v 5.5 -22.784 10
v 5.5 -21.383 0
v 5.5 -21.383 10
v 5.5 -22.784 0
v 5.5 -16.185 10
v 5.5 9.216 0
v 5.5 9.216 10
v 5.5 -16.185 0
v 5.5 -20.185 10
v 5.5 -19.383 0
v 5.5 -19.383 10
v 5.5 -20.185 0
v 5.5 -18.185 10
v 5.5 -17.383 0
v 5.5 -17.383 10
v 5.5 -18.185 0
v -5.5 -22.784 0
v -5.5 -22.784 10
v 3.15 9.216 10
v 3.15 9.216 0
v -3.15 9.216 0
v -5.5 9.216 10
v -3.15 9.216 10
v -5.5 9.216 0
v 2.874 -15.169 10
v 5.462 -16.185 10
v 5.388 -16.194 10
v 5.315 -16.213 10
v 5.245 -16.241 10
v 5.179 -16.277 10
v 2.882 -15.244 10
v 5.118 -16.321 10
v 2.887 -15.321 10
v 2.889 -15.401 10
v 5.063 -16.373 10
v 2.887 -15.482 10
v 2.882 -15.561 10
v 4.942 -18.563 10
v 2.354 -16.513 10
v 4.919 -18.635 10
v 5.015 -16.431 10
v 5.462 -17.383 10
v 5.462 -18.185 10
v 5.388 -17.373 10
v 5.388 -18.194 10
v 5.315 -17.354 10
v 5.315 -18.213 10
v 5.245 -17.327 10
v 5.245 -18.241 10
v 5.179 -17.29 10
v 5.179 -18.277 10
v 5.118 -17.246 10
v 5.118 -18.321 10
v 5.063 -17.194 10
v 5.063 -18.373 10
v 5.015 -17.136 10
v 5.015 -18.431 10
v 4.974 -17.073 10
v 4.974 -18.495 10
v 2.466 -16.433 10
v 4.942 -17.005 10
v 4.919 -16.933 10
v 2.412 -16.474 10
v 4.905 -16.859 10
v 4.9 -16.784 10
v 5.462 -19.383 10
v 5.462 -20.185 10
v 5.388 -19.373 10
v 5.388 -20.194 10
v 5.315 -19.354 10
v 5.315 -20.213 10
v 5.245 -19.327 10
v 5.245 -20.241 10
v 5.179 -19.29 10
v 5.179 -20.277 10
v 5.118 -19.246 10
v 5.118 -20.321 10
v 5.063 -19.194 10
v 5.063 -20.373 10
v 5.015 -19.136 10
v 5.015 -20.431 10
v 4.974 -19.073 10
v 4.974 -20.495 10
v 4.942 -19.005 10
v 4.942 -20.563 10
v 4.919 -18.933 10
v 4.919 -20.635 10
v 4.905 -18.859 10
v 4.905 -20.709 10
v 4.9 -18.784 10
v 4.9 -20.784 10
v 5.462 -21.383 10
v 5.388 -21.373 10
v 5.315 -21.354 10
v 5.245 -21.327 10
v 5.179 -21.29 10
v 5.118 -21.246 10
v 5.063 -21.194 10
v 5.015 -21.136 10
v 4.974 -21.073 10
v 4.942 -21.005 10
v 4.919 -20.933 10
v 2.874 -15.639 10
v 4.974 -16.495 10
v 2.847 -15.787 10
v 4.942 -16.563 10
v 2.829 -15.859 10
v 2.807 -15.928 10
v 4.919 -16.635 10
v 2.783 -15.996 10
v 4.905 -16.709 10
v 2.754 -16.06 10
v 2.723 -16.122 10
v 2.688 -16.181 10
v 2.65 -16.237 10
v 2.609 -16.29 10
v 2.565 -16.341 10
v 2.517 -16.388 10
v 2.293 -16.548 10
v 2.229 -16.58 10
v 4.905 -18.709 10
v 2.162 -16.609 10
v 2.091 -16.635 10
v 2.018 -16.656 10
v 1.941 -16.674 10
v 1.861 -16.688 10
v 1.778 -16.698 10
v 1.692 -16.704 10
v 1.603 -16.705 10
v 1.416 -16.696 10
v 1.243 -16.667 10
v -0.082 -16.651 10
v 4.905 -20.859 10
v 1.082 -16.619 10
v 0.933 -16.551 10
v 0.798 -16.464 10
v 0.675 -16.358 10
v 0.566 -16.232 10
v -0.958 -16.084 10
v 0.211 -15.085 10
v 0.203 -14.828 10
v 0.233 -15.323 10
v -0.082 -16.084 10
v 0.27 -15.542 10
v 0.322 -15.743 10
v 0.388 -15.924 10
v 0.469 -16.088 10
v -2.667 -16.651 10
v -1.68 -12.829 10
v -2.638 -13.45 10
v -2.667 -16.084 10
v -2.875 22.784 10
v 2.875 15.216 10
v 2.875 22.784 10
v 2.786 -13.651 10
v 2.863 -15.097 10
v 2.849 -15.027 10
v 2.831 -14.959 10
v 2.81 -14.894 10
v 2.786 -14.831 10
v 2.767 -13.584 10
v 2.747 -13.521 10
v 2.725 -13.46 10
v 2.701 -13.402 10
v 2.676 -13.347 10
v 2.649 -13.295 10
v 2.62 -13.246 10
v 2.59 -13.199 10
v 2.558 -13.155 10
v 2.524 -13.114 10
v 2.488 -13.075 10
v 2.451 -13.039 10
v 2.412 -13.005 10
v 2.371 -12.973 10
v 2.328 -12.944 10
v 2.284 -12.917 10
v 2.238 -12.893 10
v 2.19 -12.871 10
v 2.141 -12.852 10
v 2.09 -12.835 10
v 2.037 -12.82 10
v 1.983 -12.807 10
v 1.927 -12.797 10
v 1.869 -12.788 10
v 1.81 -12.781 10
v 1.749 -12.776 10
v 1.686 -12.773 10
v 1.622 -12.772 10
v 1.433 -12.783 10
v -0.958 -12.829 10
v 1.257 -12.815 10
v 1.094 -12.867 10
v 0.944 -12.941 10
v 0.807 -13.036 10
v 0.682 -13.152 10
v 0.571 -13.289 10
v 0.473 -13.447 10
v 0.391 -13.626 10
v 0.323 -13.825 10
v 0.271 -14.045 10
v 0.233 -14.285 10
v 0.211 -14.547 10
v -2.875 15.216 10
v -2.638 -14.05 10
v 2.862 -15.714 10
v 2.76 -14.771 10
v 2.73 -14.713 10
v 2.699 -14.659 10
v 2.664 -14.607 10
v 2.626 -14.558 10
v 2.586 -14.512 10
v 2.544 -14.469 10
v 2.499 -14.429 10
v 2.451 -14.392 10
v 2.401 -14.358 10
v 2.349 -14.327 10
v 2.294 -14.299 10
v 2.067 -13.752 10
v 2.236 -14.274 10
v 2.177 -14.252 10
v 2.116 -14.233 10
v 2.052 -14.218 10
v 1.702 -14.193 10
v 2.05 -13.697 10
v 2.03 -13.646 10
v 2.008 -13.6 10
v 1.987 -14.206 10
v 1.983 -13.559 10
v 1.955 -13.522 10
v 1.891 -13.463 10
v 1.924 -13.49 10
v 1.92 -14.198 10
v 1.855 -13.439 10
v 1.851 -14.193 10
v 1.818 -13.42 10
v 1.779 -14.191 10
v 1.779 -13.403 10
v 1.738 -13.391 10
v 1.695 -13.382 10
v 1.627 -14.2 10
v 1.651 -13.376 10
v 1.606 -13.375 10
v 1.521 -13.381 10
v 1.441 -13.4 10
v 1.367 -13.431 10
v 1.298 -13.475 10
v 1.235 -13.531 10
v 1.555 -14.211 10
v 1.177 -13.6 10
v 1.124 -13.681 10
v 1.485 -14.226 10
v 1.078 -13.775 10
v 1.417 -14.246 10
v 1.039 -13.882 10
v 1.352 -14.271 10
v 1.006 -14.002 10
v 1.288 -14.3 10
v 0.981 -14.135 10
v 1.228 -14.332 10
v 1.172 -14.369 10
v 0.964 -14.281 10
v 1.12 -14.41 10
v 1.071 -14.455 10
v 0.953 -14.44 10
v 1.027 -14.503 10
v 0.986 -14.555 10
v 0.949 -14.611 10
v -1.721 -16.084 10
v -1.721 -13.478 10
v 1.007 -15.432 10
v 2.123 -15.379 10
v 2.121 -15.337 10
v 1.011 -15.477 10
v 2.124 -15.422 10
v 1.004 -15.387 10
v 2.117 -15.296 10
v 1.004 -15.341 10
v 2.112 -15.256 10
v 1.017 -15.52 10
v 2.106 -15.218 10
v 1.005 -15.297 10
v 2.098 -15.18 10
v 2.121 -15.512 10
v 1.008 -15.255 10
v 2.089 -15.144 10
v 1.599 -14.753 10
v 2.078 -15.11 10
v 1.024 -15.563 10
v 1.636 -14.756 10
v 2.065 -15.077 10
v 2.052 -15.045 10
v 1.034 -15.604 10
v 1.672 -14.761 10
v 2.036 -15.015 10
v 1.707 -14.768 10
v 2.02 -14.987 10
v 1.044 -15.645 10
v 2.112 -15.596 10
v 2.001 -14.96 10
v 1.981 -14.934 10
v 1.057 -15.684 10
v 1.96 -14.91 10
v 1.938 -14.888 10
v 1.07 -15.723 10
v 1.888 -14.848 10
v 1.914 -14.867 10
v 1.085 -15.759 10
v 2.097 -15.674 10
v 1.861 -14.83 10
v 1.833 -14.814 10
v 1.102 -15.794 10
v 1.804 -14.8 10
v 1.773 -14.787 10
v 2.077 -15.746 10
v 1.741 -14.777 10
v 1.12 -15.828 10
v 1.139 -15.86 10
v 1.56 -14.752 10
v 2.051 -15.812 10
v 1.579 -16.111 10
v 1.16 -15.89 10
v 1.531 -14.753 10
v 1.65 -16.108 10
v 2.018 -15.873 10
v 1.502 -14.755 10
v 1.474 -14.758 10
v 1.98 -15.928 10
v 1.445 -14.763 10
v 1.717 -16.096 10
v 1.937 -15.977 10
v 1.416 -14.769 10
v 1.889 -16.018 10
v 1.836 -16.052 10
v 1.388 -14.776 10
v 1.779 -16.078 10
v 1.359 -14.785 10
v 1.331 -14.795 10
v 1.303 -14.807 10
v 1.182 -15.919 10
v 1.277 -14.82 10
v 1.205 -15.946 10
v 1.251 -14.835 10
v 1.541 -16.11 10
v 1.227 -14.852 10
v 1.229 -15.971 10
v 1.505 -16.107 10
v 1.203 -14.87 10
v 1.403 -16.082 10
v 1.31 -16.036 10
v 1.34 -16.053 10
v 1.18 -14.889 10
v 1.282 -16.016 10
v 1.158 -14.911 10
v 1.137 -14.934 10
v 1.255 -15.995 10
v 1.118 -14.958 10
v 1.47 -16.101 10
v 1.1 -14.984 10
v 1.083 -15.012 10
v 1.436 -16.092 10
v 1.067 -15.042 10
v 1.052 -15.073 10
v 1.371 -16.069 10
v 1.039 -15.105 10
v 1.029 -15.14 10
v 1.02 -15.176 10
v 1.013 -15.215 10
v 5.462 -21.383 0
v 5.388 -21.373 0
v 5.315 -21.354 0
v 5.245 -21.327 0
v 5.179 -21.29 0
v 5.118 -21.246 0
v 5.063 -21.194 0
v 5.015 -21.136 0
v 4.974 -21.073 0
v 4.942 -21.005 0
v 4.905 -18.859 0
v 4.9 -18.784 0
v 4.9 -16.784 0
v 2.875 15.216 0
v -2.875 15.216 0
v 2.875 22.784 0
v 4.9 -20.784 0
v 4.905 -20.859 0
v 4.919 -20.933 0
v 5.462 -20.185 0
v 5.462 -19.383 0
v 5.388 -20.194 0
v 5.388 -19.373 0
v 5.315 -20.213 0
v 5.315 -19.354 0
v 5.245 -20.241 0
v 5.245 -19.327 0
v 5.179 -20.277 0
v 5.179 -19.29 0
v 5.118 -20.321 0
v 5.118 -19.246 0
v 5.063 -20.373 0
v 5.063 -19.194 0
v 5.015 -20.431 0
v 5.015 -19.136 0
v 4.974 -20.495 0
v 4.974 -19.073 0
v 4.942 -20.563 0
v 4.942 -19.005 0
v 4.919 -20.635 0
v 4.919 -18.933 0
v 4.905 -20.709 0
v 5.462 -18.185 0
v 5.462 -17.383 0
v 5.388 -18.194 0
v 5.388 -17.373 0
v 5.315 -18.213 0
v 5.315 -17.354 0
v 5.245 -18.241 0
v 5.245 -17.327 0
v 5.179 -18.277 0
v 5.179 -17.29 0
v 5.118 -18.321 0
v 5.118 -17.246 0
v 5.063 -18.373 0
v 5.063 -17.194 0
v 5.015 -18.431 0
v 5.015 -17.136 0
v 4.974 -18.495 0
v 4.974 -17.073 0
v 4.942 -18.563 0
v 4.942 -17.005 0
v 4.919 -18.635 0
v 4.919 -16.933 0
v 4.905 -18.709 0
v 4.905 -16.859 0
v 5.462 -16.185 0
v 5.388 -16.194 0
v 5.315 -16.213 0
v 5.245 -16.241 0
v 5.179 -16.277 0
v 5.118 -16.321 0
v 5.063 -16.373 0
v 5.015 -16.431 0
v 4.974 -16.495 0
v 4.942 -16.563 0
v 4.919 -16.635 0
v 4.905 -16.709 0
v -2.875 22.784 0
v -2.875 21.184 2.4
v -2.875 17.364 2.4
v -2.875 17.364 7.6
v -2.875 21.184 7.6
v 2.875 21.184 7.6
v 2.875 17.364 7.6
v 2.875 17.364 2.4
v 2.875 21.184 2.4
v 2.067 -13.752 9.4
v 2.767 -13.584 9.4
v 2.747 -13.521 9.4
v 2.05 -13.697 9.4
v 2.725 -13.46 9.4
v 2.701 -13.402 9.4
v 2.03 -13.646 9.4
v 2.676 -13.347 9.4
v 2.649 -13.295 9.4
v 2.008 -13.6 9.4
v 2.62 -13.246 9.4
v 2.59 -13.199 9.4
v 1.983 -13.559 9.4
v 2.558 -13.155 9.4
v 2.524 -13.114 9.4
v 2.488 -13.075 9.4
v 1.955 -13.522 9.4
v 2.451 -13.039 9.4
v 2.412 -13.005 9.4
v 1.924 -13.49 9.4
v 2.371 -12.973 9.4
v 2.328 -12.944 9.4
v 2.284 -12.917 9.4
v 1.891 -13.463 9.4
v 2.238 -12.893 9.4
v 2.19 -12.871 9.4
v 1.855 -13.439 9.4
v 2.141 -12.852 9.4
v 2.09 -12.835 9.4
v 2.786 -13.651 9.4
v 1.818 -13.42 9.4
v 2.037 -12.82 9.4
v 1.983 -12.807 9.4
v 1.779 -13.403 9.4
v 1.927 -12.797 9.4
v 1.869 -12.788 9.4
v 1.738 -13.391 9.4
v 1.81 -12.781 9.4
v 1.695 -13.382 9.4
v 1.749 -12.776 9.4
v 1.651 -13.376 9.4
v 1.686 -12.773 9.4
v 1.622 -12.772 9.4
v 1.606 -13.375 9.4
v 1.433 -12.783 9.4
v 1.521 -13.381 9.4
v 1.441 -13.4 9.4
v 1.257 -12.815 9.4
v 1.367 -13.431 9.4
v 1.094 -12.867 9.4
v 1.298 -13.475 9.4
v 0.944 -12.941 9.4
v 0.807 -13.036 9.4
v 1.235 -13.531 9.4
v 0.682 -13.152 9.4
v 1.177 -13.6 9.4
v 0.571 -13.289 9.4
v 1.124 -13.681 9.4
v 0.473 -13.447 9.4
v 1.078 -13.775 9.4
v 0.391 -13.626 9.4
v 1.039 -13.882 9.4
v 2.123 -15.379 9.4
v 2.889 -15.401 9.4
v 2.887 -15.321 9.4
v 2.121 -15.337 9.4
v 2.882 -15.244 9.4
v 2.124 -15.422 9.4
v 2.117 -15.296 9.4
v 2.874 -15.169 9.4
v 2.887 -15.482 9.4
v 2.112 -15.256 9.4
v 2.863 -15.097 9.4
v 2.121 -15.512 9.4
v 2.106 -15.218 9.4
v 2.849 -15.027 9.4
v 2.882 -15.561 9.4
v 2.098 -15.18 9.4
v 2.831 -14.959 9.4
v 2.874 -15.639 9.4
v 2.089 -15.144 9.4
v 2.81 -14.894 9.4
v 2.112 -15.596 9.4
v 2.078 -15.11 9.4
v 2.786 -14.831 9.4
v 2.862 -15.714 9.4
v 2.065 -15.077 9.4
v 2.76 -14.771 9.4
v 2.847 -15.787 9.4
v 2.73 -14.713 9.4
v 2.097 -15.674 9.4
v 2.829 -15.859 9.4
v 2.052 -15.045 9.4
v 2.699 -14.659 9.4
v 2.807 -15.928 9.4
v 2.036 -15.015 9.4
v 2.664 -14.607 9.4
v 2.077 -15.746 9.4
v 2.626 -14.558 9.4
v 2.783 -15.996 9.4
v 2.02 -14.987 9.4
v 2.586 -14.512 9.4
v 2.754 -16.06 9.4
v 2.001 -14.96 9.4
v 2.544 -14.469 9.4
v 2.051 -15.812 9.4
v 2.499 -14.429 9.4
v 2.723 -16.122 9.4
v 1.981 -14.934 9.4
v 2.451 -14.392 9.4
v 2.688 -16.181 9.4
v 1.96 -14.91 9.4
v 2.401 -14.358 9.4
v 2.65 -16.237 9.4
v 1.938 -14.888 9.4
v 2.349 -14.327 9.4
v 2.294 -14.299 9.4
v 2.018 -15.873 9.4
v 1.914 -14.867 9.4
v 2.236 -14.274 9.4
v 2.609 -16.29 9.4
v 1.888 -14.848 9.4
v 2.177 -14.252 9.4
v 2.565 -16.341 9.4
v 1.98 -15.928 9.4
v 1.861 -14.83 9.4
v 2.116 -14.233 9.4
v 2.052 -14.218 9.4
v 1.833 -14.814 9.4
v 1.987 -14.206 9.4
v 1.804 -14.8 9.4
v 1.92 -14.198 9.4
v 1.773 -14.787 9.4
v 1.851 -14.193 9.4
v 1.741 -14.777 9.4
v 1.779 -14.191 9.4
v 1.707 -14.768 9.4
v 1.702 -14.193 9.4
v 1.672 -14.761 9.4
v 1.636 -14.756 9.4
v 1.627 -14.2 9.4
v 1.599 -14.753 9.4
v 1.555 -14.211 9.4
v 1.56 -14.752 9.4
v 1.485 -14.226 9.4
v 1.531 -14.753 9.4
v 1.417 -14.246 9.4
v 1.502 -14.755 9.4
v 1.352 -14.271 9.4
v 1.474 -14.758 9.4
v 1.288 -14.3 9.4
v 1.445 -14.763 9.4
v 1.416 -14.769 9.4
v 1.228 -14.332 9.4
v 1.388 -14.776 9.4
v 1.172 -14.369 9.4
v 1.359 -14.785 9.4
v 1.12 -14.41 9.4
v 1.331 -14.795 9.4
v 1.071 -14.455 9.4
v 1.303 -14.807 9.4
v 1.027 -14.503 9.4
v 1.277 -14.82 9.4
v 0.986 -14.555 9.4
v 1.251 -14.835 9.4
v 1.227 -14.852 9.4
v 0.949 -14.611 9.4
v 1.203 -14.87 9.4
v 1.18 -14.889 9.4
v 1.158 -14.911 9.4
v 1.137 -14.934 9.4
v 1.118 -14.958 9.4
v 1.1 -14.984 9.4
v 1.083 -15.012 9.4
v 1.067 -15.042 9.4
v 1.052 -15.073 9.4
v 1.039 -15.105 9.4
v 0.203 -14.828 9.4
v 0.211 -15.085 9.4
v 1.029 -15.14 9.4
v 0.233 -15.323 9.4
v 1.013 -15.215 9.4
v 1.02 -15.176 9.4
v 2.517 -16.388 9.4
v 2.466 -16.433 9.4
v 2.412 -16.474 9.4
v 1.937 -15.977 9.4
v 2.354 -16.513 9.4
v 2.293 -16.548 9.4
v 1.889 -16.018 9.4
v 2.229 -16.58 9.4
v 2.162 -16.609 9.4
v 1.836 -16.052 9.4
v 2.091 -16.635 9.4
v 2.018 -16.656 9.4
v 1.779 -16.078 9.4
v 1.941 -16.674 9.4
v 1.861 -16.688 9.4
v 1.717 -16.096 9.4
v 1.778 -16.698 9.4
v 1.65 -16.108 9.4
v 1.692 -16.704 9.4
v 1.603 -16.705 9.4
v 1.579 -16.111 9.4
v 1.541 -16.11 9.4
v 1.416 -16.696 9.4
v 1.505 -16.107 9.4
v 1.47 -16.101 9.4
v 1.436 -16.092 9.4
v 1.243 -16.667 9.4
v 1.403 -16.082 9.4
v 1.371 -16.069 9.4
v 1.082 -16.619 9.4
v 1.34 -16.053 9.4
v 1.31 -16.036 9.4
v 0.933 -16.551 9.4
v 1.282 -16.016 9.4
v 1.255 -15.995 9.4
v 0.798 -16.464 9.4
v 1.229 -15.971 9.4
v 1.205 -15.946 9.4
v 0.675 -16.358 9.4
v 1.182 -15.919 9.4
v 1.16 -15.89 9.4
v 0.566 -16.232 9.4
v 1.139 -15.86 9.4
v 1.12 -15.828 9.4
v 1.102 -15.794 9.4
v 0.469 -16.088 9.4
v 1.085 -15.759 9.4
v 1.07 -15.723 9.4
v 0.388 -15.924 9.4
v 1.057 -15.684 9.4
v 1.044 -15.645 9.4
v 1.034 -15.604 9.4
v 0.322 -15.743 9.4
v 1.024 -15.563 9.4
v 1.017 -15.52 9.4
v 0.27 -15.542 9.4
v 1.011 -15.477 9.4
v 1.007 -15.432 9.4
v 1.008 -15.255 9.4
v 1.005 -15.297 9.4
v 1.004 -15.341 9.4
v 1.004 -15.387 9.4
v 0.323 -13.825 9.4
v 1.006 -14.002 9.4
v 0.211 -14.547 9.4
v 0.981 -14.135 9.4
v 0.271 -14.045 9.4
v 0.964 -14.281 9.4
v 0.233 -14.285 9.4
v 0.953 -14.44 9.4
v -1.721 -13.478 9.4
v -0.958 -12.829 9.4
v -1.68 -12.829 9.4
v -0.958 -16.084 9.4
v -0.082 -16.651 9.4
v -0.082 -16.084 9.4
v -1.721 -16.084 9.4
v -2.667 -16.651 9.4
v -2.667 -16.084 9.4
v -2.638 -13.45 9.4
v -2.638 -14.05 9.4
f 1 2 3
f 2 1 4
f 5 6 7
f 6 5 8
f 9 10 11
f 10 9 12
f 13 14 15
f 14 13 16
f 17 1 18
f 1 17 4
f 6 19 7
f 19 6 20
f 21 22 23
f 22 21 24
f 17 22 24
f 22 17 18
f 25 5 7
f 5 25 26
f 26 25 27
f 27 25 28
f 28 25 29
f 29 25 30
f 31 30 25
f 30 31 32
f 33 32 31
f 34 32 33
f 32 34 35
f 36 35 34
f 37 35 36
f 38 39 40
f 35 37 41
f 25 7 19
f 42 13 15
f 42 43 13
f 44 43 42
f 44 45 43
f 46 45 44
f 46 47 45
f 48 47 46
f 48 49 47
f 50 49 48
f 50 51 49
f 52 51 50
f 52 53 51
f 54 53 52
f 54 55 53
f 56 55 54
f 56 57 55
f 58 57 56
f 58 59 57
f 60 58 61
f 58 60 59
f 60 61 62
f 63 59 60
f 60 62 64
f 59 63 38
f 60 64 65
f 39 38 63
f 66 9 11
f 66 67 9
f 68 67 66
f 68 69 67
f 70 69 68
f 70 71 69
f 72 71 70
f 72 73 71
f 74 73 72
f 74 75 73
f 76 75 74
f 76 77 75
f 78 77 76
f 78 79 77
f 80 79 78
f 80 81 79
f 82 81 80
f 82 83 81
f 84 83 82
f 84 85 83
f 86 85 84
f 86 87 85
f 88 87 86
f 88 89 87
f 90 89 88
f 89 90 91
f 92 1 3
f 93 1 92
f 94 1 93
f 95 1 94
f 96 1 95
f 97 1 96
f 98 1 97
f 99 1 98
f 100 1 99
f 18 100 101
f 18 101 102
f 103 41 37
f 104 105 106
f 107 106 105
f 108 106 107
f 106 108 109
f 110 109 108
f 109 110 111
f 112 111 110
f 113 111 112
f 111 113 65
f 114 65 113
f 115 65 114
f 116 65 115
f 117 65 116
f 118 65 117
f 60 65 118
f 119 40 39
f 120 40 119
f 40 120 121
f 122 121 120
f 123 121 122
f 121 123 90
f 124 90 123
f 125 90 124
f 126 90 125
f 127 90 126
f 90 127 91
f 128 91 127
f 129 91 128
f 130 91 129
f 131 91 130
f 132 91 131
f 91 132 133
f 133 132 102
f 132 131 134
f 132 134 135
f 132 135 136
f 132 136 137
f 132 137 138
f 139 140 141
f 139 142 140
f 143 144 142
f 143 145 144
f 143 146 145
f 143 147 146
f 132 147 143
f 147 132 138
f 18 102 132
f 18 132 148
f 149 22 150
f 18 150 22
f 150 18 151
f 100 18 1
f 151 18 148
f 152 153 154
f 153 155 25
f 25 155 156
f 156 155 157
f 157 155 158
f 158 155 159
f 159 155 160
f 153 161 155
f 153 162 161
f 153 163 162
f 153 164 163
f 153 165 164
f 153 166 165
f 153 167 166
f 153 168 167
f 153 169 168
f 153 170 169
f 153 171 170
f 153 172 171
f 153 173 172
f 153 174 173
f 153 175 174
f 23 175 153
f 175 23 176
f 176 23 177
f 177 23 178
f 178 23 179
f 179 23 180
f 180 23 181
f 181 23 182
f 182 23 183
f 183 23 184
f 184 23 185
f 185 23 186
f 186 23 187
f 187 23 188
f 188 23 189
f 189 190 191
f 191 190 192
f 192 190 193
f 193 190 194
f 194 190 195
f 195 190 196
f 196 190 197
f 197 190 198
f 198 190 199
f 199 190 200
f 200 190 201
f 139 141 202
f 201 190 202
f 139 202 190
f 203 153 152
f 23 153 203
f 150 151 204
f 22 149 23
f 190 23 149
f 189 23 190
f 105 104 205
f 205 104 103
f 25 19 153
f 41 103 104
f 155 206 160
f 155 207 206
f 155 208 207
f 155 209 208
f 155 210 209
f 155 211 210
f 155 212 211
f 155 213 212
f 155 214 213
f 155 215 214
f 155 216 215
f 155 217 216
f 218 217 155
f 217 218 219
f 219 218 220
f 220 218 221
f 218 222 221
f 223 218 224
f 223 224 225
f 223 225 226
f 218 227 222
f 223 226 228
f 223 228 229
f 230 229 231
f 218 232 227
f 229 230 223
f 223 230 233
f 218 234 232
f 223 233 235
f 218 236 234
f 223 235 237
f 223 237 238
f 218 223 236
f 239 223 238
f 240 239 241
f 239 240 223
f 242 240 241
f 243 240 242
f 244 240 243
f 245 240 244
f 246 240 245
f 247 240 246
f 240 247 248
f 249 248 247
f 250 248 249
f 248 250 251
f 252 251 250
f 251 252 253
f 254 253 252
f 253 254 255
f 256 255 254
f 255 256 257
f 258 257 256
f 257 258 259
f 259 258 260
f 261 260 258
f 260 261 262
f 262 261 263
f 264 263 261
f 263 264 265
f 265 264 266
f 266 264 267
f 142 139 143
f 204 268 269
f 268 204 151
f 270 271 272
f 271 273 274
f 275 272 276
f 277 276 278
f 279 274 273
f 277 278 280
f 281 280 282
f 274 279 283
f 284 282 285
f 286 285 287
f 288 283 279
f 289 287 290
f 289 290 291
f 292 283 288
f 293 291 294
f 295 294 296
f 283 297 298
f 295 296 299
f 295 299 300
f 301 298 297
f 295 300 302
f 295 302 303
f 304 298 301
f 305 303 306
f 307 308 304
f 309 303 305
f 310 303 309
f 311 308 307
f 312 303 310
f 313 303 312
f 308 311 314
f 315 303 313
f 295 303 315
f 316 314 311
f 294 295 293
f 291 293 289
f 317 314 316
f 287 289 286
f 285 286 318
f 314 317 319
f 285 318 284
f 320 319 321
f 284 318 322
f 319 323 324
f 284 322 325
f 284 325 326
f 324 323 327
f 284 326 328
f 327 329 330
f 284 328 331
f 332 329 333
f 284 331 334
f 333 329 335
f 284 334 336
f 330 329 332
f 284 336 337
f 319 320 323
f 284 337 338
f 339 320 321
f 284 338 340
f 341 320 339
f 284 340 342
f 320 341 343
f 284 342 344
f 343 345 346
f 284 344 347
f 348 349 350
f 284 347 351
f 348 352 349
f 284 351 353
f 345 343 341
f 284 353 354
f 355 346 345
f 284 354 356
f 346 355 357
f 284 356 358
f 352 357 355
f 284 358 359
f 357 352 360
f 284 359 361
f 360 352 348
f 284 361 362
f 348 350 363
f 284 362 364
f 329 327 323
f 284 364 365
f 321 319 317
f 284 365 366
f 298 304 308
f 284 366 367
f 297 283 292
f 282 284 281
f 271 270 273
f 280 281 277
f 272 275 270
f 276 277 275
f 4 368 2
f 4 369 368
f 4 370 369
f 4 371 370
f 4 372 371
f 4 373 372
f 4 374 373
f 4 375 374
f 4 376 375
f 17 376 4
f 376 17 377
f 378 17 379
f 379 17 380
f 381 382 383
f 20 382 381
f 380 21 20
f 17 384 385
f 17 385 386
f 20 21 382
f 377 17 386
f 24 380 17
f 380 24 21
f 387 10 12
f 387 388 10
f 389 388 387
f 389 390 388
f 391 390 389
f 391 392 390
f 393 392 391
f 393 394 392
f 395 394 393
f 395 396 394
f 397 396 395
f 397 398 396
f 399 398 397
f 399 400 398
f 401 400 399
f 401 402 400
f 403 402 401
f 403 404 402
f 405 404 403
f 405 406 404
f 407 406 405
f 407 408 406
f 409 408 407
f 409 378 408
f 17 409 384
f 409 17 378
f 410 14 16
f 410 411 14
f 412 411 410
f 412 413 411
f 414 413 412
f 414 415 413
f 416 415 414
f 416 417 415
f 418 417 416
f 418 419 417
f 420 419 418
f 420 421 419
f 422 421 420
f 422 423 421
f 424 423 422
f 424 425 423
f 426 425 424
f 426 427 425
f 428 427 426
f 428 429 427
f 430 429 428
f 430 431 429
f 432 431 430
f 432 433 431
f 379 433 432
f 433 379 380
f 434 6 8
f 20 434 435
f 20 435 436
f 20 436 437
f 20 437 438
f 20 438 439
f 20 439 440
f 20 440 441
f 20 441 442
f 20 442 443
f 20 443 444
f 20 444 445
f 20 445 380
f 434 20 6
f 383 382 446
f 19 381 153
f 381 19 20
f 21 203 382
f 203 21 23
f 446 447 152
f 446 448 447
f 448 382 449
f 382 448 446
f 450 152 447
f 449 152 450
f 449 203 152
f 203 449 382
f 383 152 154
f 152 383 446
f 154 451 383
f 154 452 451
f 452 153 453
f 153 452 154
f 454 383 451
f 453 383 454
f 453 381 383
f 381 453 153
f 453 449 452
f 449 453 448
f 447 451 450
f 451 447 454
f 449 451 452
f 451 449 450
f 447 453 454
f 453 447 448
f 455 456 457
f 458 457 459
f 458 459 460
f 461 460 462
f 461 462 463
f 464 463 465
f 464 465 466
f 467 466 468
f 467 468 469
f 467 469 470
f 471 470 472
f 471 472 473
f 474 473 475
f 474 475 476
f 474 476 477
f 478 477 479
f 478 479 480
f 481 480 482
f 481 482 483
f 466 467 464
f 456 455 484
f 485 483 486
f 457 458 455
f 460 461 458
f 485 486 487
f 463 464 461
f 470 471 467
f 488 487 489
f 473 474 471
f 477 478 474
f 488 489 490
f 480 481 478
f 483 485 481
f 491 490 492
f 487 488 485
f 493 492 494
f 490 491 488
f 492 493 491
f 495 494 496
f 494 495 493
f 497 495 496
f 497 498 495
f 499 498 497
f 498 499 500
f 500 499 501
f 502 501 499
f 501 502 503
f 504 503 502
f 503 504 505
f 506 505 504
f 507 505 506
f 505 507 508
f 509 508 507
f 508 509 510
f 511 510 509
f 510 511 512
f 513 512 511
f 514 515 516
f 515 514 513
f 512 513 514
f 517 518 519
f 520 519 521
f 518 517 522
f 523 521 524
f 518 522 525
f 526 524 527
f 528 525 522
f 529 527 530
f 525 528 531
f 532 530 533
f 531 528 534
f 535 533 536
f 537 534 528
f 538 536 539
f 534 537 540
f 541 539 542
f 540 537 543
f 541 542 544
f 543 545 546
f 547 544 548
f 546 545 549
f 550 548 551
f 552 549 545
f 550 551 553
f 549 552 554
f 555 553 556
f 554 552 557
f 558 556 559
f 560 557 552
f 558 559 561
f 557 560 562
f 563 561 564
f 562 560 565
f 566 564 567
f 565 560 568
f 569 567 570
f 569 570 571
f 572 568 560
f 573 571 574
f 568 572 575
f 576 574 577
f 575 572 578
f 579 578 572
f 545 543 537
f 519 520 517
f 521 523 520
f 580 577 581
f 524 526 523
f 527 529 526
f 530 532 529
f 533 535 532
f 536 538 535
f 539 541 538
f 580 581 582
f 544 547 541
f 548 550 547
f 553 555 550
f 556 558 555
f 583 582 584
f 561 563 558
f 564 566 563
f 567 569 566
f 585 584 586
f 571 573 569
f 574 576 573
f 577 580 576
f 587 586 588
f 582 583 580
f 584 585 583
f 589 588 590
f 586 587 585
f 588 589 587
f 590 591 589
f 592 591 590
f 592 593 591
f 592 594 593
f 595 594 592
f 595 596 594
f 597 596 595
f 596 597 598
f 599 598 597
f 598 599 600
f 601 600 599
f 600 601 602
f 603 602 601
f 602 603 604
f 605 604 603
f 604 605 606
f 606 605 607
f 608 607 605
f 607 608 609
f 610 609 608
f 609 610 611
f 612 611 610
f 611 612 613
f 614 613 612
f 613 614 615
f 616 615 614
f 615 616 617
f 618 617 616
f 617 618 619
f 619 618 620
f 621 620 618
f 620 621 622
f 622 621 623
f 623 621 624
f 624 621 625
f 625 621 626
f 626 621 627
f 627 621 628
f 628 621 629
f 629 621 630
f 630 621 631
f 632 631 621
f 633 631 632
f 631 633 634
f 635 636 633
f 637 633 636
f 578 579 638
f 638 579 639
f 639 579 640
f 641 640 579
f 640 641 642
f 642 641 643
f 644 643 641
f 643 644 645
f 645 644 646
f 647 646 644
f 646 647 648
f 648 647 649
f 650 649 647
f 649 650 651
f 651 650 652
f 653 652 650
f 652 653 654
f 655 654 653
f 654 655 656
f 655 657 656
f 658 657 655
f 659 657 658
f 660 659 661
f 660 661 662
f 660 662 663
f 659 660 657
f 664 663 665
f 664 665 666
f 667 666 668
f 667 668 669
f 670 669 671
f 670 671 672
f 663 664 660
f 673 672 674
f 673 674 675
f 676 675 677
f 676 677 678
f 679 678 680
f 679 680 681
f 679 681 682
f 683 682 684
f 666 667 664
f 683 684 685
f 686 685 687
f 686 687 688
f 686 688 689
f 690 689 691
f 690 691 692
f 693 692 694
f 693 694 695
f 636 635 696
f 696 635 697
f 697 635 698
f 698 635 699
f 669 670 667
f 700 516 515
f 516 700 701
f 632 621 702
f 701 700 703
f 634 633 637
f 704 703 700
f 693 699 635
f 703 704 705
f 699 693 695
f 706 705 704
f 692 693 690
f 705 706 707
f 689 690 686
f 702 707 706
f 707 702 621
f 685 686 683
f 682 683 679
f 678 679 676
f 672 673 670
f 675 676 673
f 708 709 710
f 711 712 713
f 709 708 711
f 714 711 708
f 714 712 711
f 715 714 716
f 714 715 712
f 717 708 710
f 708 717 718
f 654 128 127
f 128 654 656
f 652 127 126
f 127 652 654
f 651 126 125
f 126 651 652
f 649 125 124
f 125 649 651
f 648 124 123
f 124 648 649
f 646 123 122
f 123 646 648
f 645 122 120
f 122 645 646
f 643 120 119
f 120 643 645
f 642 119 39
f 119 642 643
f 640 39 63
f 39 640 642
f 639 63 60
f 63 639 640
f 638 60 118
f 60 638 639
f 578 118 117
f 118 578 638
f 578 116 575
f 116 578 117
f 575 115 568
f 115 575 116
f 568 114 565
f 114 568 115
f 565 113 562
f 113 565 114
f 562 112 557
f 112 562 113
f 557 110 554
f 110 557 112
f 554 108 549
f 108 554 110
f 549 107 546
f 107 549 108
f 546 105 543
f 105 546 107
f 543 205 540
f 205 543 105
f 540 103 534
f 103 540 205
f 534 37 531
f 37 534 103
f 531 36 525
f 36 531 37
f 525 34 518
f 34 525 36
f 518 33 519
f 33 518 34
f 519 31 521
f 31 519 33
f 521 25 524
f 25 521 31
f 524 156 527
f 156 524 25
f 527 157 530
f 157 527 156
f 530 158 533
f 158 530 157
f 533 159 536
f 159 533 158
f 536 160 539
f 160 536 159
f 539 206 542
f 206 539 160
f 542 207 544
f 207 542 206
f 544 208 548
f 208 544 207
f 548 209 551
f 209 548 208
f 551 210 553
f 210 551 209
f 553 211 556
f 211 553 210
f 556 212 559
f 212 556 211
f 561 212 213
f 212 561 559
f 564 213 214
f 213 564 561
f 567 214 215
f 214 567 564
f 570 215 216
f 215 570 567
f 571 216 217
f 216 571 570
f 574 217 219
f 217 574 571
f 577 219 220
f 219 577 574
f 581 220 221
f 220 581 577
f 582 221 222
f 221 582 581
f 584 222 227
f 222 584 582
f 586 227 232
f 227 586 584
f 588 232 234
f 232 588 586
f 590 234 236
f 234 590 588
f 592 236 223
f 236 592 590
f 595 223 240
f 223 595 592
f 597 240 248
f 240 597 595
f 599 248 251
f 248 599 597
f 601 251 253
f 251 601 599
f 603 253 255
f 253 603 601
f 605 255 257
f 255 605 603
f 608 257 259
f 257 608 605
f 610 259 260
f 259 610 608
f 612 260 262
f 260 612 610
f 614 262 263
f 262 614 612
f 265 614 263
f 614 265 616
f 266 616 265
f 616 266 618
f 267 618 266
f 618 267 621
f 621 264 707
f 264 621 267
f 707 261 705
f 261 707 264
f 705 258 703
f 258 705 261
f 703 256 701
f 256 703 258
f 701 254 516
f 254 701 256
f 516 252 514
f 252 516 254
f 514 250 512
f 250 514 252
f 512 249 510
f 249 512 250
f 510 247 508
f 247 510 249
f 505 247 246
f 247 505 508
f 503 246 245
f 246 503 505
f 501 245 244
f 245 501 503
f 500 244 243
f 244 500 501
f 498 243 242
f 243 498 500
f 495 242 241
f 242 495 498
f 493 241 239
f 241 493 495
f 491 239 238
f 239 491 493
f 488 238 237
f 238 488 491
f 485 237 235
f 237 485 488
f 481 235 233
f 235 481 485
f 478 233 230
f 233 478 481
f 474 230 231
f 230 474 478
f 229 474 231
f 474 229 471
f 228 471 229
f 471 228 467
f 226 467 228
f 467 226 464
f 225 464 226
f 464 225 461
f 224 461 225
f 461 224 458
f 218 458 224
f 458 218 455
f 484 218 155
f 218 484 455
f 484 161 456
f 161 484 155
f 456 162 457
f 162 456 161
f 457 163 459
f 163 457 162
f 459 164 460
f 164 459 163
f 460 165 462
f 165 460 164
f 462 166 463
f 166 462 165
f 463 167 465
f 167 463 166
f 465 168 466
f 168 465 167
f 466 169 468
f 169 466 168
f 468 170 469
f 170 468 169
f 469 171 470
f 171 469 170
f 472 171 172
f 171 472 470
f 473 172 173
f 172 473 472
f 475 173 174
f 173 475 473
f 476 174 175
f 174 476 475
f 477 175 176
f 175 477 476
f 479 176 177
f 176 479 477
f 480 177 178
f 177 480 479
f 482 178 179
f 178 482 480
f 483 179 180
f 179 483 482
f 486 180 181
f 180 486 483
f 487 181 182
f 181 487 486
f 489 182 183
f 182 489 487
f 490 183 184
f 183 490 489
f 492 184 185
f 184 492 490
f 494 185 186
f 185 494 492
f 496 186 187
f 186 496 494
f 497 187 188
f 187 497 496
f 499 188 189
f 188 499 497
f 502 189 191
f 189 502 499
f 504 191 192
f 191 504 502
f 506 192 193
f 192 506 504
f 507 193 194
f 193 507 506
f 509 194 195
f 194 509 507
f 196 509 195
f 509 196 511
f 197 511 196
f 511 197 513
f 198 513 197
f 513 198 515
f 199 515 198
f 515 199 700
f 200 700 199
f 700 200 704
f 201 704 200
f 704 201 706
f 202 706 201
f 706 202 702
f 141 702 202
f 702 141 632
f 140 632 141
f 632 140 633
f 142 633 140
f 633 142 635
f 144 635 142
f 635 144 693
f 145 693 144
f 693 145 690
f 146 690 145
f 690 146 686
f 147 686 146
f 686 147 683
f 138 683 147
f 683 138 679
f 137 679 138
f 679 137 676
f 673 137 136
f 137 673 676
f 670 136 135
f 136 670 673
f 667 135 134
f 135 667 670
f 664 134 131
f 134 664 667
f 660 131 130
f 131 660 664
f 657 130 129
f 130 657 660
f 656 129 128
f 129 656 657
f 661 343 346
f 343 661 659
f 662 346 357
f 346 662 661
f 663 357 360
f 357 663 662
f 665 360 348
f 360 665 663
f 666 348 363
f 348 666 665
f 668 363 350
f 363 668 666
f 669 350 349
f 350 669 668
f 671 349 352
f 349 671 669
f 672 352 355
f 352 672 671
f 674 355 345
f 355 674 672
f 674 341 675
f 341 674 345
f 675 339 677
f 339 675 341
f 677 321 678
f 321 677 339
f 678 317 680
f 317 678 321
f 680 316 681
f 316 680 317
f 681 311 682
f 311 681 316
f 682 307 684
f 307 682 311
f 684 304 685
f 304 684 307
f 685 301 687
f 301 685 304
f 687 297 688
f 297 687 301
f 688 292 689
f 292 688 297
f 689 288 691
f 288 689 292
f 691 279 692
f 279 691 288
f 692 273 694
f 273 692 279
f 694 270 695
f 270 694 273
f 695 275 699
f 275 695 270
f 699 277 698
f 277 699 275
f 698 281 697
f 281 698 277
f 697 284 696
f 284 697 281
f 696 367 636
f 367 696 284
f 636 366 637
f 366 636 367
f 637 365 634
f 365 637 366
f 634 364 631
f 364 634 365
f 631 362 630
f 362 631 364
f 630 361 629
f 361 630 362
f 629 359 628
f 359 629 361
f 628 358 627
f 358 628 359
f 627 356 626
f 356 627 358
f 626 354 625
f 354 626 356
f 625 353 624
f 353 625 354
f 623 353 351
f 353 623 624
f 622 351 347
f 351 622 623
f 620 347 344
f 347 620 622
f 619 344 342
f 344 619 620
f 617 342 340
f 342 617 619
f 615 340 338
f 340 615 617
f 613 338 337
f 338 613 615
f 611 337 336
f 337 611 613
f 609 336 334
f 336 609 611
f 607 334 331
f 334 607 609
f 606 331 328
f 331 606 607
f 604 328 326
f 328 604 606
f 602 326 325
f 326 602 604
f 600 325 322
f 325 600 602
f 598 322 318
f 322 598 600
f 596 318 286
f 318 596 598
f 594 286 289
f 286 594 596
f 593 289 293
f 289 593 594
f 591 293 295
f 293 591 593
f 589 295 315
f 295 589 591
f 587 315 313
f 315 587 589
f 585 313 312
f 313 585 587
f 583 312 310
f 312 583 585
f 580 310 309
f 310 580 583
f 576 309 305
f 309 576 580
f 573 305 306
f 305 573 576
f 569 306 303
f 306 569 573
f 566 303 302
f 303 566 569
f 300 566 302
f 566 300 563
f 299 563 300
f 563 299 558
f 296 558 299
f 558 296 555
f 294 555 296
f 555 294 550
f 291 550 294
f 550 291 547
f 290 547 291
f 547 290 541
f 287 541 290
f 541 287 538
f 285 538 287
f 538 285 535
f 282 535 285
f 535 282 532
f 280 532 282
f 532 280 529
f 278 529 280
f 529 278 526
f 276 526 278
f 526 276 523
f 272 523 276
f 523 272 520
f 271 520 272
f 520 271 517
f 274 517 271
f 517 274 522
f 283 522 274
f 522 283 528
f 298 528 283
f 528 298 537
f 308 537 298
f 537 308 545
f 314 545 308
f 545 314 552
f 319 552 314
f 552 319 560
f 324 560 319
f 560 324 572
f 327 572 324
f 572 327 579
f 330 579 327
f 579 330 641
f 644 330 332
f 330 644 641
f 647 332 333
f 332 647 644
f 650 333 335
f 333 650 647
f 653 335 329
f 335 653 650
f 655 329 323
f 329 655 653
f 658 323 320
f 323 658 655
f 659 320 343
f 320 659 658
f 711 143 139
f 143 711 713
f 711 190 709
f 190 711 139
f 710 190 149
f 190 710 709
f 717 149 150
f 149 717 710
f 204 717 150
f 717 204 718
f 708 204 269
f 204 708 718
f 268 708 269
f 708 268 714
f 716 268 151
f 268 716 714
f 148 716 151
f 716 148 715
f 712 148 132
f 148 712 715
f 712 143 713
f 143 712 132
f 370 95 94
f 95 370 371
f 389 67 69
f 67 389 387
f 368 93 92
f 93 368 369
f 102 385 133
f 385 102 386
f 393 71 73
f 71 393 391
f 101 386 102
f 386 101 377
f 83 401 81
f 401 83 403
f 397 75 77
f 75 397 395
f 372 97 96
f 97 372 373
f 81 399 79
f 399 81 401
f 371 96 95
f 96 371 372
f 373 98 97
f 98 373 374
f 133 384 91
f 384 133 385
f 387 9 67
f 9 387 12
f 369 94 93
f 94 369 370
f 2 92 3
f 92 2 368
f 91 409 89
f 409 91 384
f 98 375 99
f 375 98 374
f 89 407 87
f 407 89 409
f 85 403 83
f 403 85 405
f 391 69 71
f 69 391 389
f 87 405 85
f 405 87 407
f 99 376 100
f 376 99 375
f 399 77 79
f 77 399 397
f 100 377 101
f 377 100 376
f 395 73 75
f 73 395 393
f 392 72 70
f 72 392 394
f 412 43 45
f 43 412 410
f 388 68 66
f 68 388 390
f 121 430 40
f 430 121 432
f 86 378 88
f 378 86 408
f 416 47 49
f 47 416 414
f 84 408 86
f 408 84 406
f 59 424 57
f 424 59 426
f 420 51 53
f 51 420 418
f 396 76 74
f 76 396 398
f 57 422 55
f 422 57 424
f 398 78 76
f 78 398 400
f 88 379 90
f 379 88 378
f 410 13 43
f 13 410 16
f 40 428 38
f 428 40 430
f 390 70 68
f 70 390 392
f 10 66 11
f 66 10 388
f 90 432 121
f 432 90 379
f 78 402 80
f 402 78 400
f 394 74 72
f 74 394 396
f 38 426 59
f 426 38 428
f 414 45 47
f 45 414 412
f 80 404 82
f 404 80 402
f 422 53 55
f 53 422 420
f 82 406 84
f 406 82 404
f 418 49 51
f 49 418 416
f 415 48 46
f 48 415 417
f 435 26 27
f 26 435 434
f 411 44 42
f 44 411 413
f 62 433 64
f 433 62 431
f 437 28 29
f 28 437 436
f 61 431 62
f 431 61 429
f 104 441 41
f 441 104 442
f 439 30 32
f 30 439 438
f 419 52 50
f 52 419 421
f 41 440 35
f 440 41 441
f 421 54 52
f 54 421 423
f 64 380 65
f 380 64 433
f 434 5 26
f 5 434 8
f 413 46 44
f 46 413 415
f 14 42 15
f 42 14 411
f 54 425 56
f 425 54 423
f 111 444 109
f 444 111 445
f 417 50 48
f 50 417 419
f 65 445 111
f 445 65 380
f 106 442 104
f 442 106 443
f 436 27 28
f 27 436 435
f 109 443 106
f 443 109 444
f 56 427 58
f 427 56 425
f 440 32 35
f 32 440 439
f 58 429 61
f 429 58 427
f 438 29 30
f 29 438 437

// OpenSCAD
$fn = 50;

difference() {
	union() {
		translate(v = [0, 9.21625, 0]) {
			rotate(a = [90, 0, 0]) {
				difference() {
					union() {
						translate(v = [-5.5, 0, 0]) {
							cube(size = [11.0, 10.0, 32.0]);
						}
						translate(v = [0, 10.0, 0]) {
							rotate(a = [90, 0, 0]) {
								linear_extrude(height = 10.0) {
									polygon(points = [[-2.875, -13.5675], [2.875, -13.5675], [2.875, -6.0], [3.15, 0], [3.15, 0.1], [-3.15, 0.1], [-3.15, 0], [-2.875, -6.0]]);
								}
							}
						}
					}
					union() {
						translate(v = [-2.975, 2.4000000000000004, -11.9675]) {
							cube(size = [5.95, 5.199999999999999, 3.8200000000000003]);
						}
						translate(v = [0, 9.4, 24.0]) {
							rotate(a = [-90, 0, 0]) {
								linear_extrude(height = 0.7) {
									text(font = "Arial:style=Bold", halign = "center", size = 4.0, text = "16", valign = "center");
								}
							}
						}
						translate(v = [5.5, 10.1, 30.0]) {
							rotate(a = [90, 0, 0]) {
								cylinder(h = 10.2, r = 0.6);
							}
						}
						translate(v = [5.5, 10.1, 28.0]) {
							rotate(a = [90, 0, 0]) {
								cylinder(h = 10.2, r = 0.6);
							}
						}
						translate(v = [5.5, 10.1, 26.0]) {
							rotate(a = [90, 0, 0]) {
								cylinder(h = 10.2, r = 0.6);
							}
						}
					}
				}
			}
		}
	}
	union();
}
